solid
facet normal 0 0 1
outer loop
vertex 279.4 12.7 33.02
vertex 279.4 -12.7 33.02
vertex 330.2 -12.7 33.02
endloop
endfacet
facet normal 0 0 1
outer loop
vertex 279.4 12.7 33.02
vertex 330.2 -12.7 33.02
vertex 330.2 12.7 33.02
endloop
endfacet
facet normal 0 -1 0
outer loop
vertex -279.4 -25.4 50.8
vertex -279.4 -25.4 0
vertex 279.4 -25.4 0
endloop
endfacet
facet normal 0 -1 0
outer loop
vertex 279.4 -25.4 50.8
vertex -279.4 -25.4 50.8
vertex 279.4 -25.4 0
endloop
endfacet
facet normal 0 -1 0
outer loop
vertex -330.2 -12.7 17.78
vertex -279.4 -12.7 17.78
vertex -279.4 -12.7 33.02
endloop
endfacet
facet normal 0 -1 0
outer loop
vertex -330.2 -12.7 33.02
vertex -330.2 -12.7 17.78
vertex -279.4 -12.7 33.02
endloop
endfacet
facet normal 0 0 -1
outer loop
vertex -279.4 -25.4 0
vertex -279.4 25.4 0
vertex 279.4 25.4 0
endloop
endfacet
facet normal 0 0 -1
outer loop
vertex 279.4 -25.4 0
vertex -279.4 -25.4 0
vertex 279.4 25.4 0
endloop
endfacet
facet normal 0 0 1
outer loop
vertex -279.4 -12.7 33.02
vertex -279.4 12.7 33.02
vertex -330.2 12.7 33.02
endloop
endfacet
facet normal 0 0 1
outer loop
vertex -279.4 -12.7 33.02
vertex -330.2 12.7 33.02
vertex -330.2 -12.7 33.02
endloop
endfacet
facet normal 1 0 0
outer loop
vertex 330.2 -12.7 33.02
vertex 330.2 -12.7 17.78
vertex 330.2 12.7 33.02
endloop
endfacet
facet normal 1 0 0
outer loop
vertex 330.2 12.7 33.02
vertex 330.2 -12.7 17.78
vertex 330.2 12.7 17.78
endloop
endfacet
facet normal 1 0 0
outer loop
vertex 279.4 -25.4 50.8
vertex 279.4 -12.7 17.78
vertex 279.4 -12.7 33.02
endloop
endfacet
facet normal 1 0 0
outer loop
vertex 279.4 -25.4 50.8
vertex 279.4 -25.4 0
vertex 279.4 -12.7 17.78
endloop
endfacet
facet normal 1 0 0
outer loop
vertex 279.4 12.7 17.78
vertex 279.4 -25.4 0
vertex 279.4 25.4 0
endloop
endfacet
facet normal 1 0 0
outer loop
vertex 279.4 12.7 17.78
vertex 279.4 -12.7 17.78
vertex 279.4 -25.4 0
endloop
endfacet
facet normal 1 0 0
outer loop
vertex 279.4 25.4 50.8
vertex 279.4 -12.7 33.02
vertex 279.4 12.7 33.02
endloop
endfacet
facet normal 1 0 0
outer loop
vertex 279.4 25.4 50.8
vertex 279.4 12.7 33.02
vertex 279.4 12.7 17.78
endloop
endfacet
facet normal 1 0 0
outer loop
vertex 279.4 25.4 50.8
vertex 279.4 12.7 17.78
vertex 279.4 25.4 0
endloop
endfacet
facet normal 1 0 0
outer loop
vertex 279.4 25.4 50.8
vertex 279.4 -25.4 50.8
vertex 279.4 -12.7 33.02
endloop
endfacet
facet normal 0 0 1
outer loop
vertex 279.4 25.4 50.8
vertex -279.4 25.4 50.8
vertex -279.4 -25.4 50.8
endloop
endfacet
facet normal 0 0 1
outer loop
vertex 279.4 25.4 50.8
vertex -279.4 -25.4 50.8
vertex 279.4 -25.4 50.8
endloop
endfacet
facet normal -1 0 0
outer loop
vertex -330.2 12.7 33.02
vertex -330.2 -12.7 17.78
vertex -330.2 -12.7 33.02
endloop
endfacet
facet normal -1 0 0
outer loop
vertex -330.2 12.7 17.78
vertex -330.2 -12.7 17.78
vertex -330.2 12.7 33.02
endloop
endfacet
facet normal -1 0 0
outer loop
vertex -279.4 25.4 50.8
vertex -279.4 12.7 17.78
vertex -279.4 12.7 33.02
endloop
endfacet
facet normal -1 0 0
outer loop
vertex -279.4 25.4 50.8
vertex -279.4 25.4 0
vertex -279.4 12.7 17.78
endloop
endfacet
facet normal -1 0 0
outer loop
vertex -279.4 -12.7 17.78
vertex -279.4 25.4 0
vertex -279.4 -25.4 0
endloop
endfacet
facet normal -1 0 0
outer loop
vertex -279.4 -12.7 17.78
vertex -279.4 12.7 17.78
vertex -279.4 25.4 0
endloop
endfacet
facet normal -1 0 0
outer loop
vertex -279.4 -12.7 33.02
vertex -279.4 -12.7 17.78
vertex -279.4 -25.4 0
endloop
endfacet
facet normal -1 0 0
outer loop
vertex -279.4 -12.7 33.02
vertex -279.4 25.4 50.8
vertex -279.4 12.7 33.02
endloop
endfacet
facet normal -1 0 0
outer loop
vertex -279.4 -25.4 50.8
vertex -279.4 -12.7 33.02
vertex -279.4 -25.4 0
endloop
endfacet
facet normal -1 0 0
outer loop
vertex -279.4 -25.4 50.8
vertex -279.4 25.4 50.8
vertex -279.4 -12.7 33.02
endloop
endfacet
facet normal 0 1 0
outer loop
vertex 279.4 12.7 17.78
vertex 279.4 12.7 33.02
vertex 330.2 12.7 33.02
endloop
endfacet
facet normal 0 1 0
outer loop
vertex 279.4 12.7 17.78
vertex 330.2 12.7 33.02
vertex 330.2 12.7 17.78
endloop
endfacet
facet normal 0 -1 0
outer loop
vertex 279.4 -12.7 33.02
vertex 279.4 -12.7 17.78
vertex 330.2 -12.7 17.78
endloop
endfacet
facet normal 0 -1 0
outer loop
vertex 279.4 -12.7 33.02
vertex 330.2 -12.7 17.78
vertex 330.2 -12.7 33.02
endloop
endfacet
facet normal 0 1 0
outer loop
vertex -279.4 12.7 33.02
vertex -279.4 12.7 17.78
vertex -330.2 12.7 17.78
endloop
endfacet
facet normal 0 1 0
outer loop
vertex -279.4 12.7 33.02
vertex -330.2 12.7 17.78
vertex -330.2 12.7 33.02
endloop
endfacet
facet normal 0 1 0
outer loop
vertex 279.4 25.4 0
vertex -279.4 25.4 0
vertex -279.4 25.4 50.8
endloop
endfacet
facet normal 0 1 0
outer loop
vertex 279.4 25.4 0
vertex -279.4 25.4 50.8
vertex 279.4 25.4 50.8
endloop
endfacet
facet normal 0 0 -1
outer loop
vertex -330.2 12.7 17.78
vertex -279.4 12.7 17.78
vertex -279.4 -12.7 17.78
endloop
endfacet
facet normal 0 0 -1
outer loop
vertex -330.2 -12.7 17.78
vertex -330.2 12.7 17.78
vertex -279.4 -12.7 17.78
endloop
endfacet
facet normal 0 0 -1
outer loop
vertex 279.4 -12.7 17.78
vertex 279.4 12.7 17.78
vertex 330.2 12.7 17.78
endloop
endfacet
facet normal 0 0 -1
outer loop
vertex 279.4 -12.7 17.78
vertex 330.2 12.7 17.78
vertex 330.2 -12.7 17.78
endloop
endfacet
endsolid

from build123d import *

# Parameters (mm, degrees)
F0_W     = 660.4
F0_H     = 50.8
F1_DEPTH = 50.8
F2_W     = 50.8
F2_H     = 50.8
F2_W_2   = 25.4
F2_H_2   = 15.24
F3_DEPTH = 50.8
F5_DEPTH = 50.8


with BuildPart() as f1:
    # F0 (on Top) → F1 (new body)
    with BuildSketch(Plane.XY):
        Rectangle(F0_W, F0_H)
    extrude(amount=F1_DEPTH)

    # F2 (on face) → F3 (cut)
    with BuildSketch(Plane(origin=(-330.2, 0, 0), x_dir=(0, -1, 0), z_dir=(-1, 0, 0))):
        with Locations((0, 25.4)):
            Rectangle(F2_W, F2_H)
        with Locations((0, 25.4)):
            Rectangle(F2_W_2, F2_H_2, mode=Mode.SUBTRACT)
    extrude(amount=-F3_DEPTH, mode=Mode.SUBTRACT)

    # F4 (on face) → F5 (cut)
    with BuildSketch(Plane.YZ.offset(330.2)):
        Polygon((-12.7, 17.78), (-25.4, 17.78), (-25.4, 0), (0, 0), (25.4, 0), (25.4, 17.78), (12.7, 17.78), align=None)
        Polygon((-25.4, 33.02), (-25.4, 17.78), (-12.7, 17.78), (-12.7, 25.4), (-12.7, 33.02), align=None)
        Polygon((-25.4, 50.8), (-25.4, 33.02), (-12.7, 33.02), (12.7, 33.02), (25.4, 33.02), (25.4, 50.8), (0, 50.8), align=None)
        Polygon((12.7, 25.4), (12.7, 17.78), (25.4, 17.78), (25.4, 33.02), (12.7, 33.02), align=None)
    extrude(amount=-F5_DEPTH, mode=Mode.SUBTRACT)


solid = f1.part
